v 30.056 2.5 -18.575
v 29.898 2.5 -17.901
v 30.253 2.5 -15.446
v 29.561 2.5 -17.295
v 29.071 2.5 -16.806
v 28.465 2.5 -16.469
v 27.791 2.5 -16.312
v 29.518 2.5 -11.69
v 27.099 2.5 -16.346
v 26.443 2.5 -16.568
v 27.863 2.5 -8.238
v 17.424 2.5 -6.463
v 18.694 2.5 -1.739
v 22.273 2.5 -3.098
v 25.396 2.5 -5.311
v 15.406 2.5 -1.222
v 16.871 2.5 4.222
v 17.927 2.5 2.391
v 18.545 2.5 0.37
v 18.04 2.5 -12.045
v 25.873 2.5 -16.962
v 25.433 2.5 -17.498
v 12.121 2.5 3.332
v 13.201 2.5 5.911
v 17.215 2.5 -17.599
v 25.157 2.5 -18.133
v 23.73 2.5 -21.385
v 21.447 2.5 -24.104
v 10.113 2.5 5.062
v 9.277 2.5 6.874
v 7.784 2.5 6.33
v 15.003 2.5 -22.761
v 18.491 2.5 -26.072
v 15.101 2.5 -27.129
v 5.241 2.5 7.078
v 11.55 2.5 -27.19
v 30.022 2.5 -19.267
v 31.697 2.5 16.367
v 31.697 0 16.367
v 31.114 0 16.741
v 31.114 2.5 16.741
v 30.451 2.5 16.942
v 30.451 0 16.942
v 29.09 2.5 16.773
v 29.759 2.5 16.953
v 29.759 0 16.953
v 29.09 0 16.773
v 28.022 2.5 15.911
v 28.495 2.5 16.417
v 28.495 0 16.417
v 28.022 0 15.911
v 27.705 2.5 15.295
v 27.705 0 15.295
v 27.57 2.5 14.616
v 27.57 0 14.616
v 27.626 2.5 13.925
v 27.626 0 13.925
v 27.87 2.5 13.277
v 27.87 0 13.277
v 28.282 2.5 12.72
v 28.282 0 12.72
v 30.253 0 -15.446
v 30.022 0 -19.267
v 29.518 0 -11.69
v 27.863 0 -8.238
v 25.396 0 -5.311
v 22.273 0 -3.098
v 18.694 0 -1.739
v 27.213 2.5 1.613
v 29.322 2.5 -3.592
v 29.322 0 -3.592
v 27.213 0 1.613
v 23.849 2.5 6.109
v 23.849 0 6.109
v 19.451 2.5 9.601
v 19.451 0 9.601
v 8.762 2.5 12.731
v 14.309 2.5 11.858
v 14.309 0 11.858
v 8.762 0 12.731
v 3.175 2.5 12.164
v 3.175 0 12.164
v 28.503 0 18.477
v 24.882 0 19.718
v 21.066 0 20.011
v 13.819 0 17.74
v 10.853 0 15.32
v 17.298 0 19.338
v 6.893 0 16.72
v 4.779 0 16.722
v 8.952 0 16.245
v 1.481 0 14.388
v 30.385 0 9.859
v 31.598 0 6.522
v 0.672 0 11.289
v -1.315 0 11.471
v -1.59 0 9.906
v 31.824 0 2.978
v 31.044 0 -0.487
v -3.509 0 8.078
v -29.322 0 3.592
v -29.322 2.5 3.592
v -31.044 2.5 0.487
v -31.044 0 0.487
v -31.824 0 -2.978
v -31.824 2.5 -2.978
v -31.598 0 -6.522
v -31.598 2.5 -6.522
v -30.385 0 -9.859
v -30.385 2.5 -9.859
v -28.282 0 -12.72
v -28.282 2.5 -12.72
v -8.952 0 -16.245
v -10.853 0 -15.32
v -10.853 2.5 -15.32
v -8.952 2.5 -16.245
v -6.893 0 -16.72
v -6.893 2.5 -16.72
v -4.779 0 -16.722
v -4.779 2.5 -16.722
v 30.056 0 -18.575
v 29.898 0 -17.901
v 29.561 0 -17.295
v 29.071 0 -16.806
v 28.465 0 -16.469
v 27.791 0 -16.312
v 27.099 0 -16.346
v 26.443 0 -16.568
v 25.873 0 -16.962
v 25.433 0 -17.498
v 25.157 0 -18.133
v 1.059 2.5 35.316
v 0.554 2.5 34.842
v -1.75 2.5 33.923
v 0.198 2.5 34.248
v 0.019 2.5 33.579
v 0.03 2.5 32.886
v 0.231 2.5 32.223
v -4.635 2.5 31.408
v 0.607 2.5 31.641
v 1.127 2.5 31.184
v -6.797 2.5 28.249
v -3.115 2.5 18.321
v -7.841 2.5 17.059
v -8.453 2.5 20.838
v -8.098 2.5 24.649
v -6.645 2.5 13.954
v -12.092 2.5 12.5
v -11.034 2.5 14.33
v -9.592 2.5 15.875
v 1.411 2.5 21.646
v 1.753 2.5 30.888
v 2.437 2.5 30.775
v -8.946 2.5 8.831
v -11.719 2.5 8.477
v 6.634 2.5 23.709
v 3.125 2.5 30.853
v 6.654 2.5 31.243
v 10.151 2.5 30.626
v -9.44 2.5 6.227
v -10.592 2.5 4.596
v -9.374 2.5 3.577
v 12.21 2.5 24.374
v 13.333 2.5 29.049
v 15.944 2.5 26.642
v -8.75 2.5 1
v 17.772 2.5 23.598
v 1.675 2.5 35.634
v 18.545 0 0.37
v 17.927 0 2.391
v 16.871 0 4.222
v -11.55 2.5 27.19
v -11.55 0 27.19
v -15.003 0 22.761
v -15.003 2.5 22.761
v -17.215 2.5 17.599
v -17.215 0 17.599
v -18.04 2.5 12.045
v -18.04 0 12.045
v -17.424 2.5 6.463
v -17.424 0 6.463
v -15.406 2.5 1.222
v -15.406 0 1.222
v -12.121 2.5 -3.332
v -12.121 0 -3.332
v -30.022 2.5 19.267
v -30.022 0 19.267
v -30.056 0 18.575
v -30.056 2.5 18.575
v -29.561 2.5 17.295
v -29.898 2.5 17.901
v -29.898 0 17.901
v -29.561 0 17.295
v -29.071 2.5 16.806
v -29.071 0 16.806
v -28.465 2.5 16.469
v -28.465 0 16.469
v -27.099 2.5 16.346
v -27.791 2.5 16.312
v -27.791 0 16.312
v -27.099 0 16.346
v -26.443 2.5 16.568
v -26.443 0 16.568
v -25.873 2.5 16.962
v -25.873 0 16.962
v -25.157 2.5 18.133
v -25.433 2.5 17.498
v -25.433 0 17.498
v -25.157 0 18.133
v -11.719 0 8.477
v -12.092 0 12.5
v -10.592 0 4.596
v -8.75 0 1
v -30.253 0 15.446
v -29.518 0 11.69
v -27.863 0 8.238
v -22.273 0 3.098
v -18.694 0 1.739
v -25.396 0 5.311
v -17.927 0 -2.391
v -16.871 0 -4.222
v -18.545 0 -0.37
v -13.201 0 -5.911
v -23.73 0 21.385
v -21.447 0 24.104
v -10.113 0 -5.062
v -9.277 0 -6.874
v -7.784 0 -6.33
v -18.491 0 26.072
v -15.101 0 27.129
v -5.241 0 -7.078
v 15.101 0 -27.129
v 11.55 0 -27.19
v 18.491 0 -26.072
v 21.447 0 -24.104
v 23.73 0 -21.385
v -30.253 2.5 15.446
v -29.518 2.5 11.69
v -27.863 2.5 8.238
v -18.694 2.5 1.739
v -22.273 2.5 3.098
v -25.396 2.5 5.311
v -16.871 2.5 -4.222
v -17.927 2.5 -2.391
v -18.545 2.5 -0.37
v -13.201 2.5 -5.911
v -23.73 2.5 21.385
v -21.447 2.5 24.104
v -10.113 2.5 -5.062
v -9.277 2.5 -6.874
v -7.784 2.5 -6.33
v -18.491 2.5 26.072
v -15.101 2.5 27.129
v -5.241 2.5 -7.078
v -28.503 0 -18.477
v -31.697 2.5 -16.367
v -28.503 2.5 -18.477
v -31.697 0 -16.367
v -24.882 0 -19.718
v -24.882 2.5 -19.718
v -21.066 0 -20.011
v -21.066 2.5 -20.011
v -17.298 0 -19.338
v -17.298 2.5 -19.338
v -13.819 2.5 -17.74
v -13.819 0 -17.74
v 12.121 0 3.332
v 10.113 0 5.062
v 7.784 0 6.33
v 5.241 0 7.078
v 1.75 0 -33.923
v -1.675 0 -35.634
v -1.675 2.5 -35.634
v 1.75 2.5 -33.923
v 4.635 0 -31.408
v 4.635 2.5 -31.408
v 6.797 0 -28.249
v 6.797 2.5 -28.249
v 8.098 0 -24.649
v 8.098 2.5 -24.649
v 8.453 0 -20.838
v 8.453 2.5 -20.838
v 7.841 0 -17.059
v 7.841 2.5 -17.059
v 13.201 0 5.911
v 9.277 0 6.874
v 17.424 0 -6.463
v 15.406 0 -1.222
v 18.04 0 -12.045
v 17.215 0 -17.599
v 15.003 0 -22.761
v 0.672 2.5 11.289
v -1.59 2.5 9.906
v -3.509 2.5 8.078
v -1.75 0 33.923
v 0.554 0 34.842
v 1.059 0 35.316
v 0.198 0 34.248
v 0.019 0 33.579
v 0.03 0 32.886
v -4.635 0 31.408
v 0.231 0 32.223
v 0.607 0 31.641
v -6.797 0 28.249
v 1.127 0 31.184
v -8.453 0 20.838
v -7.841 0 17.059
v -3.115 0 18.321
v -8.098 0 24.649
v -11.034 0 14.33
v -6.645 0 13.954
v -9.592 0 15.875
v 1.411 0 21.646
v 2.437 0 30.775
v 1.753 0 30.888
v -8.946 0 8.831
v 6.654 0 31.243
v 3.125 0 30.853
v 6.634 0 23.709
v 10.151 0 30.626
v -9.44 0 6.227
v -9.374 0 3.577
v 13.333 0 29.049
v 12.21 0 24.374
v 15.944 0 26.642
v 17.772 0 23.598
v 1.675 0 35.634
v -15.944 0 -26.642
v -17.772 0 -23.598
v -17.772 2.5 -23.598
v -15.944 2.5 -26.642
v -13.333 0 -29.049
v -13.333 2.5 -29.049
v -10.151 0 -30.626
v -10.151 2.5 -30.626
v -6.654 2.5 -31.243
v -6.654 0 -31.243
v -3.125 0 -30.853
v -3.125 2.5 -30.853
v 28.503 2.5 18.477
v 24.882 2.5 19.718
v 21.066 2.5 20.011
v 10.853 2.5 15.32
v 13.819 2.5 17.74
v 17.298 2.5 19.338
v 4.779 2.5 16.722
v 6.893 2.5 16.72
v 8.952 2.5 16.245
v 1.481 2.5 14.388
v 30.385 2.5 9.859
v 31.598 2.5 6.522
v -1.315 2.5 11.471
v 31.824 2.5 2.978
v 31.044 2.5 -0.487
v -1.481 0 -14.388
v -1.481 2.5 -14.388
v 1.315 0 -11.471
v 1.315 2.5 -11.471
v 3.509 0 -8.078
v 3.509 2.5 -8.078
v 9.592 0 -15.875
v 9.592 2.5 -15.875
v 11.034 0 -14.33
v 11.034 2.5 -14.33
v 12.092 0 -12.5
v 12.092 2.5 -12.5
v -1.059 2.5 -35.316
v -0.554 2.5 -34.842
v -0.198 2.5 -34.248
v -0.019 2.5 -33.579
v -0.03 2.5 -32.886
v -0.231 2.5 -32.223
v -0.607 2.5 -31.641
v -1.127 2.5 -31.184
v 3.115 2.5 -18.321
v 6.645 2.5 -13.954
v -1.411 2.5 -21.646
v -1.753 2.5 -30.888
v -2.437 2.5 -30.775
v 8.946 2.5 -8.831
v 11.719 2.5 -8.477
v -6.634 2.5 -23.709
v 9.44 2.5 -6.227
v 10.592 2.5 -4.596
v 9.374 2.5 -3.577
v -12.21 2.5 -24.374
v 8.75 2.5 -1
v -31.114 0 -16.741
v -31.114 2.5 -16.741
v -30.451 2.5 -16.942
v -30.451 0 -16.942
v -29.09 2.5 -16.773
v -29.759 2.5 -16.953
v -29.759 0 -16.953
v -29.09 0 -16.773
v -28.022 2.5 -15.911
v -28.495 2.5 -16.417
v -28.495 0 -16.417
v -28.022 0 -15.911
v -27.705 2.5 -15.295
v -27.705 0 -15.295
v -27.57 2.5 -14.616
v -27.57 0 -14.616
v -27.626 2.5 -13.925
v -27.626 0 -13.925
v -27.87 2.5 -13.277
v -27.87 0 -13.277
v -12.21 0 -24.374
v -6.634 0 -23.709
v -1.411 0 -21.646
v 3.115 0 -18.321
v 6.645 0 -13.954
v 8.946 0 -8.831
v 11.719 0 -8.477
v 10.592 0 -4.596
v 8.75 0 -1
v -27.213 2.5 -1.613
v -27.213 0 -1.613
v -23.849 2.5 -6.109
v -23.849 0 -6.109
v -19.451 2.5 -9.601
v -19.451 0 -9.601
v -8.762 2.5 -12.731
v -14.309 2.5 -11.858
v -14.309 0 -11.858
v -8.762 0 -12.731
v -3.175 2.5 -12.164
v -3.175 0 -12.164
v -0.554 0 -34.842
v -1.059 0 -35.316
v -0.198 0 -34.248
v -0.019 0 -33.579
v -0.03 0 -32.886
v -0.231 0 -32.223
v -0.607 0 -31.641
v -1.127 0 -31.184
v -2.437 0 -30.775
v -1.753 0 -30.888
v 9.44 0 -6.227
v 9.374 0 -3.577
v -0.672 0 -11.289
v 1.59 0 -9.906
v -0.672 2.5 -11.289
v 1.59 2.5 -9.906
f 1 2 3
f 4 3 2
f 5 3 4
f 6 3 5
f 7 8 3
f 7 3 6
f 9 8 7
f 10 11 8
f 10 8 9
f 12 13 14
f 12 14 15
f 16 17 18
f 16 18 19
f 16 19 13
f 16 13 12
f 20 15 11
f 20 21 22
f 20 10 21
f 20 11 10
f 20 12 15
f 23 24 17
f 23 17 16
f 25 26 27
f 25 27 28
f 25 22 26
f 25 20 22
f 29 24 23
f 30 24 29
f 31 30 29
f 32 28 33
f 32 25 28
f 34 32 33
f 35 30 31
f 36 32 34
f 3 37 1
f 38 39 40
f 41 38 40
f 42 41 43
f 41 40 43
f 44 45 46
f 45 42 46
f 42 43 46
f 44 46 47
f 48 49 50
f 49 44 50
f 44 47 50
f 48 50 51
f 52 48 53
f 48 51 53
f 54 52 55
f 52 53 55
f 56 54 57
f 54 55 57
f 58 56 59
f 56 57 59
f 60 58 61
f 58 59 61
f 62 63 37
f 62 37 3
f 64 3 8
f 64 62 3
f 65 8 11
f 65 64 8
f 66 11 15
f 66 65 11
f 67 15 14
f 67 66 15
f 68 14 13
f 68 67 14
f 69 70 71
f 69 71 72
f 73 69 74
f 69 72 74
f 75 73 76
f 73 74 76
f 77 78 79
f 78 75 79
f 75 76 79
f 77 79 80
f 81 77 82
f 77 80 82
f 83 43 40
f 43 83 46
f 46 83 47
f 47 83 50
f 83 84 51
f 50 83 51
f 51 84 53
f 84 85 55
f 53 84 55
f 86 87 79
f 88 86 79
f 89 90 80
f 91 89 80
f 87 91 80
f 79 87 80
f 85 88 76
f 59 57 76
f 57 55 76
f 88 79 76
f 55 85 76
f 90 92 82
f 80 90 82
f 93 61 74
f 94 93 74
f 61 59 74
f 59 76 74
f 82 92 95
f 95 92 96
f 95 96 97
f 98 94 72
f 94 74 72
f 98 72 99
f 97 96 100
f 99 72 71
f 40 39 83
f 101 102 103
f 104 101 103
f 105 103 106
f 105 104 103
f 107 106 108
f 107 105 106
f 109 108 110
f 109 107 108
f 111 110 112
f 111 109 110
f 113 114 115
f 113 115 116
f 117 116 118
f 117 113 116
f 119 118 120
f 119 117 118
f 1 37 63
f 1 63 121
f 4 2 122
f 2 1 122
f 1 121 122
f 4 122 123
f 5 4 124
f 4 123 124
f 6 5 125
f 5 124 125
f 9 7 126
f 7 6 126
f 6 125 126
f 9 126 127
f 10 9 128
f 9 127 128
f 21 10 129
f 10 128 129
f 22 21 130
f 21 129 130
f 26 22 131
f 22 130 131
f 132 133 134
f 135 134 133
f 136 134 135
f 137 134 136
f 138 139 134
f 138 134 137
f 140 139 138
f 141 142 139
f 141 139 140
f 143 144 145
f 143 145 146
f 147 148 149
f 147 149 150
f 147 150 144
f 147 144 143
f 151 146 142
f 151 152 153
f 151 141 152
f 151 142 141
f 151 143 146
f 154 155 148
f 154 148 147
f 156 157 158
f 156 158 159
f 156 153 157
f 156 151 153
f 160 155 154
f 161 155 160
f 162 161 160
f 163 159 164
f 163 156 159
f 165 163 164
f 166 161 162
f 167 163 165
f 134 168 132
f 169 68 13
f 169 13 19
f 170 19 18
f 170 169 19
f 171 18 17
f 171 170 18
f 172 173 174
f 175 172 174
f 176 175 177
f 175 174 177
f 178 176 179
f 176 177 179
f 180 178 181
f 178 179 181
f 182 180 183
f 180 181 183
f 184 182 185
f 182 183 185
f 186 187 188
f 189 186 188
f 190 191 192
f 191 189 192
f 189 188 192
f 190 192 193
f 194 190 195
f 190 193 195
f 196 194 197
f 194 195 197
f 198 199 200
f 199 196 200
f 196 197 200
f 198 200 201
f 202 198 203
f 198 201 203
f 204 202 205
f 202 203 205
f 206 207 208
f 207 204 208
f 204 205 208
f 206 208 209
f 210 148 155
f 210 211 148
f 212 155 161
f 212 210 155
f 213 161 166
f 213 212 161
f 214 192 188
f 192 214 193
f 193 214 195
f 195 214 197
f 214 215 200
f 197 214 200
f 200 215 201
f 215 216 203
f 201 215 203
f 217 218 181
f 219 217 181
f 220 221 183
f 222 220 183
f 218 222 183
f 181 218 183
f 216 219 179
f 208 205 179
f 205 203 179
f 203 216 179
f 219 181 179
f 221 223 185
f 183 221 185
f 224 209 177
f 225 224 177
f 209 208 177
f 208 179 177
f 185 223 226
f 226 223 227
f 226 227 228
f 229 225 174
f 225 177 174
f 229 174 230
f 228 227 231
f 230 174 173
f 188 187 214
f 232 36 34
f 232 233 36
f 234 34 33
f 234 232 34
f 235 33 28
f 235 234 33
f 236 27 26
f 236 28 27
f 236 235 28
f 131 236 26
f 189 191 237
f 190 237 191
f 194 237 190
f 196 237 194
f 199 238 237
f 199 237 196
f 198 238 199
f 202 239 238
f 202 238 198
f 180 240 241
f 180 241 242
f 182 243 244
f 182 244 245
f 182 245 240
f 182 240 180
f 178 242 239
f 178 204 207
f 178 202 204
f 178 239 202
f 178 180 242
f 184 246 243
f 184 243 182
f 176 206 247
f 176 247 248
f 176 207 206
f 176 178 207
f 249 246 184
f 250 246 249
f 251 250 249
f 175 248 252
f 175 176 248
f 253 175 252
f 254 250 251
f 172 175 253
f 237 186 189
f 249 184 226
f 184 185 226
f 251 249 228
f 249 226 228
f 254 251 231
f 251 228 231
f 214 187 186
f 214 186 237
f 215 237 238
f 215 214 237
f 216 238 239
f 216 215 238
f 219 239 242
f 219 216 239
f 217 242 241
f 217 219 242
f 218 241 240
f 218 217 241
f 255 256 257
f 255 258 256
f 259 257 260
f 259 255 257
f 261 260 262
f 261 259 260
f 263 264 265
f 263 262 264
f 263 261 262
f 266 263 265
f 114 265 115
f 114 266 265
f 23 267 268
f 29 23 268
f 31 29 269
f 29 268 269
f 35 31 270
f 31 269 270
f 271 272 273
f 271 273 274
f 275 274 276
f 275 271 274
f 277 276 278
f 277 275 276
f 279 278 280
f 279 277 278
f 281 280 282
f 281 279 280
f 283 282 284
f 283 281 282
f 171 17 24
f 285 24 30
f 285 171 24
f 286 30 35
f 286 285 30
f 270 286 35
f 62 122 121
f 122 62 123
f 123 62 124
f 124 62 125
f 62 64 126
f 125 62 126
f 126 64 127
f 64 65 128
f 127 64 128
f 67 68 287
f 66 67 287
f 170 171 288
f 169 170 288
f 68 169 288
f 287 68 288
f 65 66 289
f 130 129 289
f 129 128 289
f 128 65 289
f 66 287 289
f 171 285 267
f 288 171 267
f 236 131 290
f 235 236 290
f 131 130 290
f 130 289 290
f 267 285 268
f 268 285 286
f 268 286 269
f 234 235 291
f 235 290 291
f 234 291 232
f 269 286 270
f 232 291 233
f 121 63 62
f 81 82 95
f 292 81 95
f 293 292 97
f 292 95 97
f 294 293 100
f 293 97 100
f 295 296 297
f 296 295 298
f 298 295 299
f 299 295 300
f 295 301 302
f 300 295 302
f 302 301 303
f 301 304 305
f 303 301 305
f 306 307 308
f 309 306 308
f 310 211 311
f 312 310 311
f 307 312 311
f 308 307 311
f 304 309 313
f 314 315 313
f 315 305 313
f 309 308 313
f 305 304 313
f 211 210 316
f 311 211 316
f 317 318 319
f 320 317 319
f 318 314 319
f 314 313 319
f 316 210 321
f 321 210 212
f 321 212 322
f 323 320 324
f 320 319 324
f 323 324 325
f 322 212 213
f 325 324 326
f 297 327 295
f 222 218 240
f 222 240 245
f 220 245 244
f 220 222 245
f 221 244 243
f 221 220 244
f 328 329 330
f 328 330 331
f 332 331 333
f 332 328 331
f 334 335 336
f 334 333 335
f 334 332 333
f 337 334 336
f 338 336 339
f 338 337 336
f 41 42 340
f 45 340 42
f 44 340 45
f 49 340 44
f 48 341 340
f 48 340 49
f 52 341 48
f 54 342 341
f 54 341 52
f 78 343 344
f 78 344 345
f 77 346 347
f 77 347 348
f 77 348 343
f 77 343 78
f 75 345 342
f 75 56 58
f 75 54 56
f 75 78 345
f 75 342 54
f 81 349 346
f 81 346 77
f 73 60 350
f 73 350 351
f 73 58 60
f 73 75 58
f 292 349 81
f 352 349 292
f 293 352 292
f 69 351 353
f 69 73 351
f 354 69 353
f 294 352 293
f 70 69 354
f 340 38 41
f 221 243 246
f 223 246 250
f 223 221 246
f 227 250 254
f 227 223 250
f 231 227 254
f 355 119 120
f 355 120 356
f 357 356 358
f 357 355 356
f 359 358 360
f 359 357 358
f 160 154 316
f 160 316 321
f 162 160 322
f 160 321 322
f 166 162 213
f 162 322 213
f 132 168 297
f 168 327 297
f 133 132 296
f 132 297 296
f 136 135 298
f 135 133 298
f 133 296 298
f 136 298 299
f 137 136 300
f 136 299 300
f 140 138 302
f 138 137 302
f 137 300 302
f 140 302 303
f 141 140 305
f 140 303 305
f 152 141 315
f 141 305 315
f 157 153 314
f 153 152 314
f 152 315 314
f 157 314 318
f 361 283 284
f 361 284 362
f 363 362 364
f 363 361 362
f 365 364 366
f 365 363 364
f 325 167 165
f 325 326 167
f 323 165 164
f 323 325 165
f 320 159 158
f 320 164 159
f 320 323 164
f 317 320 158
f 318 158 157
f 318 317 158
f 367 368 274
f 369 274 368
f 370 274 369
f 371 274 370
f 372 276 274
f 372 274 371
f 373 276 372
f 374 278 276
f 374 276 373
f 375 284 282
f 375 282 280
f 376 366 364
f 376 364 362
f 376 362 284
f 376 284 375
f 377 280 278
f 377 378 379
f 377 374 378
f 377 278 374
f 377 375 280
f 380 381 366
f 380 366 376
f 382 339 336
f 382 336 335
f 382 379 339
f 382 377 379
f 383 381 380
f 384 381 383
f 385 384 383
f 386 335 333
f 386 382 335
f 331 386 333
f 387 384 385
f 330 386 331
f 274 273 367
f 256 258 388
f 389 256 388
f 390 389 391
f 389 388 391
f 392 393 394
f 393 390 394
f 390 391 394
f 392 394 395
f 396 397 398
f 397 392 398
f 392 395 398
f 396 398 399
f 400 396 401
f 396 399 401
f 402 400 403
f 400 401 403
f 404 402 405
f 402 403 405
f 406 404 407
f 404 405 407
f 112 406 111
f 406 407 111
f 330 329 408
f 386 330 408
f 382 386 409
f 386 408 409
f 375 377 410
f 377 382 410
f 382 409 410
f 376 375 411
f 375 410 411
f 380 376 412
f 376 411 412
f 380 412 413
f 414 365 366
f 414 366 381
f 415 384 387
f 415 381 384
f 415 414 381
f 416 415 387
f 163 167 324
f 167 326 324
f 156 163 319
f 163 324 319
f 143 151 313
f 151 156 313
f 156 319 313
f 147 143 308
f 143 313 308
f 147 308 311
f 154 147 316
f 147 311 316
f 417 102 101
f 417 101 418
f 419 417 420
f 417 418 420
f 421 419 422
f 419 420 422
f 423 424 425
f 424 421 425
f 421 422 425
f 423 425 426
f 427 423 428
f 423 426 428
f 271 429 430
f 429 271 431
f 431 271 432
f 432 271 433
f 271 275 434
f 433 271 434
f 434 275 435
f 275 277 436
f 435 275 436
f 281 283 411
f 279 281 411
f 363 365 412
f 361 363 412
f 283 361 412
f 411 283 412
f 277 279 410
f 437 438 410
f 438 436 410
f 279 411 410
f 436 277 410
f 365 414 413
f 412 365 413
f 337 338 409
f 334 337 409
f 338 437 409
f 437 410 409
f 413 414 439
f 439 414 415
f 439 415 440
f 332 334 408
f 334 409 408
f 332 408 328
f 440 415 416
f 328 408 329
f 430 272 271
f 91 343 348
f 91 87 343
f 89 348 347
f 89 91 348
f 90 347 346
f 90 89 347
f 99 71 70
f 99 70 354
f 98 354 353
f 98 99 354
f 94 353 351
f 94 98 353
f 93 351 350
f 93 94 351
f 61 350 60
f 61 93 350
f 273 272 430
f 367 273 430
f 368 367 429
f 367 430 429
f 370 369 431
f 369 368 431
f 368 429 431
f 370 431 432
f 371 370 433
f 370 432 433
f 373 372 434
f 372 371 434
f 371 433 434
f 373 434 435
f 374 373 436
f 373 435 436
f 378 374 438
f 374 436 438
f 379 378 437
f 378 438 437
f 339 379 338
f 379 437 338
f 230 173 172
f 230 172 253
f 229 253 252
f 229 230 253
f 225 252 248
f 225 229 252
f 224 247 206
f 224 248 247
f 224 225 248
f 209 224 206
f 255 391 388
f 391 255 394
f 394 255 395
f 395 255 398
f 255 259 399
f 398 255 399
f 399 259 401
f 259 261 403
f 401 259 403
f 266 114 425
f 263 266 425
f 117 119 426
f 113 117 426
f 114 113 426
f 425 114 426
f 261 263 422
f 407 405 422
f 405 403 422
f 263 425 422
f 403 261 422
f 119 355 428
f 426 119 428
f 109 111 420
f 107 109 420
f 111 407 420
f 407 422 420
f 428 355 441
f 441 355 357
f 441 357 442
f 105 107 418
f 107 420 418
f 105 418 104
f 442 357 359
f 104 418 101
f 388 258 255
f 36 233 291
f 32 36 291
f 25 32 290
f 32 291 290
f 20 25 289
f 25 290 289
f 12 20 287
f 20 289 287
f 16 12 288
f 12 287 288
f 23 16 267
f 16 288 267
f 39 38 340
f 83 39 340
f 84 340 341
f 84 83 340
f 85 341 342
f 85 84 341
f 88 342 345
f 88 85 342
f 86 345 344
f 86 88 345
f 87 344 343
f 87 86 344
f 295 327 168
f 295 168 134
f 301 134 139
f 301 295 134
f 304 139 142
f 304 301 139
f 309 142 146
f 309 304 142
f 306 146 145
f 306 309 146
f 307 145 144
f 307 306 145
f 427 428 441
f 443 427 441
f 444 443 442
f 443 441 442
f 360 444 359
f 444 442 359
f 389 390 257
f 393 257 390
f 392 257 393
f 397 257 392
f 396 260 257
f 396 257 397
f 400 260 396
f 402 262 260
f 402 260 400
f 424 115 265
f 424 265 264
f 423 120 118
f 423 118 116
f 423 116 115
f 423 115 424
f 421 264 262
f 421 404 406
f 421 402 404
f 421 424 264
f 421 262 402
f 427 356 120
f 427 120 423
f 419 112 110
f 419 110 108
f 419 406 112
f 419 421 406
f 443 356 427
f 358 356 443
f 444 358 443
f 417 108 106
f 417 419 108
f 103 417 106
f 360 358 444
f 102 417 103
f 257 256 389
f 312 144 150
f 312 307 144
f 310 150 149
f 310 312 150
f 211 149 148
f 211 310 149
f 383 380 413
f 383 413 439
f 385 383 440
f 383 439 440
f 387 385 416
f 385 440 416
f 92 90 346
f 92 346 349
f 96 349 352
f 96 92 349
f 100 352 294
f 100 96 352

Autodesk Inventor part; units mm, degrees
ref_plane "YZ Plane" through (0, 0, 0) normal (1, 0, 0) x (0, 1, 0)
ref_plane "XZ Plane" through (0, 0, 0) normal (0, 1, 0) x (-1, 0, 0)
sketch "スケッチ1" plane through (0, 0, 0) normal (0, 1, 0) x (-1, 0, 0)
  circle A0 centre (0, 0) radius 37.5 construction
  arc A1 (-9.4224, 1.9643) -> (7.3361, -6.2308) centre (0, 0) ccw
  arc A2 (-9.4224, 1.9643) -> (21.7871, -22.0595) centre (11.9922, -2.5) ccw
  arc A3 (7.3361, -6.2308) -> (21.7871, -22.0595) centre (6.6708, -21.3491) ccw
  arc A4 (3.125, -30.8531) -> (1.6746, -35.6335) centre (2.5, -33.2737) ccw
  arc A5 (7.283, -6.2928) -> (17.7717, -23.5977) centre (6.25, -18.75) ccw
  arc A6 (-12.0923, -12.5) -> (-9.8739, -1.8751) centre (-3.5, -8.75) ccw
  arc A7 (-8.75, -1) -> (-8.9465, -8.8314) centre (3.0185, -5.2135) ccw
  arc A8 (-8.75, -1) -> (-12.0923, -12.5) centre (9.1576, -12.4403) ccw
  point P0 (-7.8413, -17.0592)
  point P1 (6.6984, -142.534)
  point P2 (12.5, -123.4123)
  point P3 (71.0869, -94.3908)
  point P4 (-3.3189, -18.1233)
  point P5 (-6.2079, -17.7254)
  point P6 (-5.7595, -15.2826)
  point P7 (-39.4956, -7.5004)
  point P8 (87.1485, -88.2381)
  point P9 (5.5379, -6.2586)
  point P10 (-6.5853, -14.0496)
  point P11 (4.252, -6.4107)
  point P12 (5.5411, -6.2701)
  point P13 (-9.5, -1.5464)
  point P14 (-2.0507, -9.404)
  point P15 (63.4693, -48.0608)
  point P16 (-9.2313, -2.7247)
  point P17 (-9.397, -2.0823)
  point P18 (-9.8772, -2.9937)
  point P19 (-36.7334, -7.086)
  point P20 (-37.6897, 7.8571)
  point P21 (-35.7696, -6.328)
  point P22 (5.8128, -7.6715)
  point P23 (-2.4835, -9.2991)
  dimension "d0" = 75
  dimension "d1" = 19.25
  dimension "d7" = 5
  dimension "d9" = 6.25
  dimension "d10" = 18.75
  dimension "d11" = 25
  dimension "d13" = 18.75
  dimension "d15" = 8.75
  dimension "d16" = 3.5
  dimension "d17" = 2.5
  dimension "d18" = 2.5
  dimension "d19" = 43.75
  dimension "d20" = 8.75
  dimension "d21" = 1
  dimension "d23" = 3.75
  dimension "d24" = 21.25
  dimension "d25" = 12.5
extrude "押し出し1" add sketch "スケッチ1" along normal blind 2.5 contours A6 A5 A2 | A2 A5 A6 | A5 A6 A3 A2 | A5 A4 A3 A6 | A8 A7 A1 | A1 A7 A2 A8 | A3 A6 A8 A2
pattern_circular "円形状パターン1" count 6 over 360 about axis through (0, -10, 0) along (0, 1, 0) of "押し出し1"
sketch "スケッチ2" plane through (3.831, 2.5, 11.6355) normal (0, 1, 0) x (0.9998, 0, -0.0187)
  line L0 (-9.232, 3.8908) -> (-13.1897, 12.6644)
  line L1 (-13.1897, 12.6644) -> (-7.5705, 20.4788)
  line L2 (-7.5705, 20.4788) -> (2.0066, 19.5195)
  line L3 (2.0066, 19.5195) -> (5.9644, 10.7459)
  line L4 (5.9644, 10.7459) -> (0.3451, 2.9315)
  line L5 (0.3451, 2.9315) -> (-9.232, 3.8908)
  circle A0 centre (-3.6127, 11.7052) radius 9.625
  point P0 (-7.2722, 3.6945)
  point P1 (-12.3798, 10.8691)
  point P2 (-8.7204, 18.8797)
  point P3 (0.0468, 19.7158)
  point P4 (5.1545, 12.5413)
  point P5 (1.495, 4.5306)
  dimension "d27" = 19.25
ref_plane "作業平面1" through (4.1212, 2.5, 8.698) normal (0.081, 0, -0.9967) x (-0.9967, 0, -0.081)
equation "\"r\" = 75"
properties part number "LOGO"
